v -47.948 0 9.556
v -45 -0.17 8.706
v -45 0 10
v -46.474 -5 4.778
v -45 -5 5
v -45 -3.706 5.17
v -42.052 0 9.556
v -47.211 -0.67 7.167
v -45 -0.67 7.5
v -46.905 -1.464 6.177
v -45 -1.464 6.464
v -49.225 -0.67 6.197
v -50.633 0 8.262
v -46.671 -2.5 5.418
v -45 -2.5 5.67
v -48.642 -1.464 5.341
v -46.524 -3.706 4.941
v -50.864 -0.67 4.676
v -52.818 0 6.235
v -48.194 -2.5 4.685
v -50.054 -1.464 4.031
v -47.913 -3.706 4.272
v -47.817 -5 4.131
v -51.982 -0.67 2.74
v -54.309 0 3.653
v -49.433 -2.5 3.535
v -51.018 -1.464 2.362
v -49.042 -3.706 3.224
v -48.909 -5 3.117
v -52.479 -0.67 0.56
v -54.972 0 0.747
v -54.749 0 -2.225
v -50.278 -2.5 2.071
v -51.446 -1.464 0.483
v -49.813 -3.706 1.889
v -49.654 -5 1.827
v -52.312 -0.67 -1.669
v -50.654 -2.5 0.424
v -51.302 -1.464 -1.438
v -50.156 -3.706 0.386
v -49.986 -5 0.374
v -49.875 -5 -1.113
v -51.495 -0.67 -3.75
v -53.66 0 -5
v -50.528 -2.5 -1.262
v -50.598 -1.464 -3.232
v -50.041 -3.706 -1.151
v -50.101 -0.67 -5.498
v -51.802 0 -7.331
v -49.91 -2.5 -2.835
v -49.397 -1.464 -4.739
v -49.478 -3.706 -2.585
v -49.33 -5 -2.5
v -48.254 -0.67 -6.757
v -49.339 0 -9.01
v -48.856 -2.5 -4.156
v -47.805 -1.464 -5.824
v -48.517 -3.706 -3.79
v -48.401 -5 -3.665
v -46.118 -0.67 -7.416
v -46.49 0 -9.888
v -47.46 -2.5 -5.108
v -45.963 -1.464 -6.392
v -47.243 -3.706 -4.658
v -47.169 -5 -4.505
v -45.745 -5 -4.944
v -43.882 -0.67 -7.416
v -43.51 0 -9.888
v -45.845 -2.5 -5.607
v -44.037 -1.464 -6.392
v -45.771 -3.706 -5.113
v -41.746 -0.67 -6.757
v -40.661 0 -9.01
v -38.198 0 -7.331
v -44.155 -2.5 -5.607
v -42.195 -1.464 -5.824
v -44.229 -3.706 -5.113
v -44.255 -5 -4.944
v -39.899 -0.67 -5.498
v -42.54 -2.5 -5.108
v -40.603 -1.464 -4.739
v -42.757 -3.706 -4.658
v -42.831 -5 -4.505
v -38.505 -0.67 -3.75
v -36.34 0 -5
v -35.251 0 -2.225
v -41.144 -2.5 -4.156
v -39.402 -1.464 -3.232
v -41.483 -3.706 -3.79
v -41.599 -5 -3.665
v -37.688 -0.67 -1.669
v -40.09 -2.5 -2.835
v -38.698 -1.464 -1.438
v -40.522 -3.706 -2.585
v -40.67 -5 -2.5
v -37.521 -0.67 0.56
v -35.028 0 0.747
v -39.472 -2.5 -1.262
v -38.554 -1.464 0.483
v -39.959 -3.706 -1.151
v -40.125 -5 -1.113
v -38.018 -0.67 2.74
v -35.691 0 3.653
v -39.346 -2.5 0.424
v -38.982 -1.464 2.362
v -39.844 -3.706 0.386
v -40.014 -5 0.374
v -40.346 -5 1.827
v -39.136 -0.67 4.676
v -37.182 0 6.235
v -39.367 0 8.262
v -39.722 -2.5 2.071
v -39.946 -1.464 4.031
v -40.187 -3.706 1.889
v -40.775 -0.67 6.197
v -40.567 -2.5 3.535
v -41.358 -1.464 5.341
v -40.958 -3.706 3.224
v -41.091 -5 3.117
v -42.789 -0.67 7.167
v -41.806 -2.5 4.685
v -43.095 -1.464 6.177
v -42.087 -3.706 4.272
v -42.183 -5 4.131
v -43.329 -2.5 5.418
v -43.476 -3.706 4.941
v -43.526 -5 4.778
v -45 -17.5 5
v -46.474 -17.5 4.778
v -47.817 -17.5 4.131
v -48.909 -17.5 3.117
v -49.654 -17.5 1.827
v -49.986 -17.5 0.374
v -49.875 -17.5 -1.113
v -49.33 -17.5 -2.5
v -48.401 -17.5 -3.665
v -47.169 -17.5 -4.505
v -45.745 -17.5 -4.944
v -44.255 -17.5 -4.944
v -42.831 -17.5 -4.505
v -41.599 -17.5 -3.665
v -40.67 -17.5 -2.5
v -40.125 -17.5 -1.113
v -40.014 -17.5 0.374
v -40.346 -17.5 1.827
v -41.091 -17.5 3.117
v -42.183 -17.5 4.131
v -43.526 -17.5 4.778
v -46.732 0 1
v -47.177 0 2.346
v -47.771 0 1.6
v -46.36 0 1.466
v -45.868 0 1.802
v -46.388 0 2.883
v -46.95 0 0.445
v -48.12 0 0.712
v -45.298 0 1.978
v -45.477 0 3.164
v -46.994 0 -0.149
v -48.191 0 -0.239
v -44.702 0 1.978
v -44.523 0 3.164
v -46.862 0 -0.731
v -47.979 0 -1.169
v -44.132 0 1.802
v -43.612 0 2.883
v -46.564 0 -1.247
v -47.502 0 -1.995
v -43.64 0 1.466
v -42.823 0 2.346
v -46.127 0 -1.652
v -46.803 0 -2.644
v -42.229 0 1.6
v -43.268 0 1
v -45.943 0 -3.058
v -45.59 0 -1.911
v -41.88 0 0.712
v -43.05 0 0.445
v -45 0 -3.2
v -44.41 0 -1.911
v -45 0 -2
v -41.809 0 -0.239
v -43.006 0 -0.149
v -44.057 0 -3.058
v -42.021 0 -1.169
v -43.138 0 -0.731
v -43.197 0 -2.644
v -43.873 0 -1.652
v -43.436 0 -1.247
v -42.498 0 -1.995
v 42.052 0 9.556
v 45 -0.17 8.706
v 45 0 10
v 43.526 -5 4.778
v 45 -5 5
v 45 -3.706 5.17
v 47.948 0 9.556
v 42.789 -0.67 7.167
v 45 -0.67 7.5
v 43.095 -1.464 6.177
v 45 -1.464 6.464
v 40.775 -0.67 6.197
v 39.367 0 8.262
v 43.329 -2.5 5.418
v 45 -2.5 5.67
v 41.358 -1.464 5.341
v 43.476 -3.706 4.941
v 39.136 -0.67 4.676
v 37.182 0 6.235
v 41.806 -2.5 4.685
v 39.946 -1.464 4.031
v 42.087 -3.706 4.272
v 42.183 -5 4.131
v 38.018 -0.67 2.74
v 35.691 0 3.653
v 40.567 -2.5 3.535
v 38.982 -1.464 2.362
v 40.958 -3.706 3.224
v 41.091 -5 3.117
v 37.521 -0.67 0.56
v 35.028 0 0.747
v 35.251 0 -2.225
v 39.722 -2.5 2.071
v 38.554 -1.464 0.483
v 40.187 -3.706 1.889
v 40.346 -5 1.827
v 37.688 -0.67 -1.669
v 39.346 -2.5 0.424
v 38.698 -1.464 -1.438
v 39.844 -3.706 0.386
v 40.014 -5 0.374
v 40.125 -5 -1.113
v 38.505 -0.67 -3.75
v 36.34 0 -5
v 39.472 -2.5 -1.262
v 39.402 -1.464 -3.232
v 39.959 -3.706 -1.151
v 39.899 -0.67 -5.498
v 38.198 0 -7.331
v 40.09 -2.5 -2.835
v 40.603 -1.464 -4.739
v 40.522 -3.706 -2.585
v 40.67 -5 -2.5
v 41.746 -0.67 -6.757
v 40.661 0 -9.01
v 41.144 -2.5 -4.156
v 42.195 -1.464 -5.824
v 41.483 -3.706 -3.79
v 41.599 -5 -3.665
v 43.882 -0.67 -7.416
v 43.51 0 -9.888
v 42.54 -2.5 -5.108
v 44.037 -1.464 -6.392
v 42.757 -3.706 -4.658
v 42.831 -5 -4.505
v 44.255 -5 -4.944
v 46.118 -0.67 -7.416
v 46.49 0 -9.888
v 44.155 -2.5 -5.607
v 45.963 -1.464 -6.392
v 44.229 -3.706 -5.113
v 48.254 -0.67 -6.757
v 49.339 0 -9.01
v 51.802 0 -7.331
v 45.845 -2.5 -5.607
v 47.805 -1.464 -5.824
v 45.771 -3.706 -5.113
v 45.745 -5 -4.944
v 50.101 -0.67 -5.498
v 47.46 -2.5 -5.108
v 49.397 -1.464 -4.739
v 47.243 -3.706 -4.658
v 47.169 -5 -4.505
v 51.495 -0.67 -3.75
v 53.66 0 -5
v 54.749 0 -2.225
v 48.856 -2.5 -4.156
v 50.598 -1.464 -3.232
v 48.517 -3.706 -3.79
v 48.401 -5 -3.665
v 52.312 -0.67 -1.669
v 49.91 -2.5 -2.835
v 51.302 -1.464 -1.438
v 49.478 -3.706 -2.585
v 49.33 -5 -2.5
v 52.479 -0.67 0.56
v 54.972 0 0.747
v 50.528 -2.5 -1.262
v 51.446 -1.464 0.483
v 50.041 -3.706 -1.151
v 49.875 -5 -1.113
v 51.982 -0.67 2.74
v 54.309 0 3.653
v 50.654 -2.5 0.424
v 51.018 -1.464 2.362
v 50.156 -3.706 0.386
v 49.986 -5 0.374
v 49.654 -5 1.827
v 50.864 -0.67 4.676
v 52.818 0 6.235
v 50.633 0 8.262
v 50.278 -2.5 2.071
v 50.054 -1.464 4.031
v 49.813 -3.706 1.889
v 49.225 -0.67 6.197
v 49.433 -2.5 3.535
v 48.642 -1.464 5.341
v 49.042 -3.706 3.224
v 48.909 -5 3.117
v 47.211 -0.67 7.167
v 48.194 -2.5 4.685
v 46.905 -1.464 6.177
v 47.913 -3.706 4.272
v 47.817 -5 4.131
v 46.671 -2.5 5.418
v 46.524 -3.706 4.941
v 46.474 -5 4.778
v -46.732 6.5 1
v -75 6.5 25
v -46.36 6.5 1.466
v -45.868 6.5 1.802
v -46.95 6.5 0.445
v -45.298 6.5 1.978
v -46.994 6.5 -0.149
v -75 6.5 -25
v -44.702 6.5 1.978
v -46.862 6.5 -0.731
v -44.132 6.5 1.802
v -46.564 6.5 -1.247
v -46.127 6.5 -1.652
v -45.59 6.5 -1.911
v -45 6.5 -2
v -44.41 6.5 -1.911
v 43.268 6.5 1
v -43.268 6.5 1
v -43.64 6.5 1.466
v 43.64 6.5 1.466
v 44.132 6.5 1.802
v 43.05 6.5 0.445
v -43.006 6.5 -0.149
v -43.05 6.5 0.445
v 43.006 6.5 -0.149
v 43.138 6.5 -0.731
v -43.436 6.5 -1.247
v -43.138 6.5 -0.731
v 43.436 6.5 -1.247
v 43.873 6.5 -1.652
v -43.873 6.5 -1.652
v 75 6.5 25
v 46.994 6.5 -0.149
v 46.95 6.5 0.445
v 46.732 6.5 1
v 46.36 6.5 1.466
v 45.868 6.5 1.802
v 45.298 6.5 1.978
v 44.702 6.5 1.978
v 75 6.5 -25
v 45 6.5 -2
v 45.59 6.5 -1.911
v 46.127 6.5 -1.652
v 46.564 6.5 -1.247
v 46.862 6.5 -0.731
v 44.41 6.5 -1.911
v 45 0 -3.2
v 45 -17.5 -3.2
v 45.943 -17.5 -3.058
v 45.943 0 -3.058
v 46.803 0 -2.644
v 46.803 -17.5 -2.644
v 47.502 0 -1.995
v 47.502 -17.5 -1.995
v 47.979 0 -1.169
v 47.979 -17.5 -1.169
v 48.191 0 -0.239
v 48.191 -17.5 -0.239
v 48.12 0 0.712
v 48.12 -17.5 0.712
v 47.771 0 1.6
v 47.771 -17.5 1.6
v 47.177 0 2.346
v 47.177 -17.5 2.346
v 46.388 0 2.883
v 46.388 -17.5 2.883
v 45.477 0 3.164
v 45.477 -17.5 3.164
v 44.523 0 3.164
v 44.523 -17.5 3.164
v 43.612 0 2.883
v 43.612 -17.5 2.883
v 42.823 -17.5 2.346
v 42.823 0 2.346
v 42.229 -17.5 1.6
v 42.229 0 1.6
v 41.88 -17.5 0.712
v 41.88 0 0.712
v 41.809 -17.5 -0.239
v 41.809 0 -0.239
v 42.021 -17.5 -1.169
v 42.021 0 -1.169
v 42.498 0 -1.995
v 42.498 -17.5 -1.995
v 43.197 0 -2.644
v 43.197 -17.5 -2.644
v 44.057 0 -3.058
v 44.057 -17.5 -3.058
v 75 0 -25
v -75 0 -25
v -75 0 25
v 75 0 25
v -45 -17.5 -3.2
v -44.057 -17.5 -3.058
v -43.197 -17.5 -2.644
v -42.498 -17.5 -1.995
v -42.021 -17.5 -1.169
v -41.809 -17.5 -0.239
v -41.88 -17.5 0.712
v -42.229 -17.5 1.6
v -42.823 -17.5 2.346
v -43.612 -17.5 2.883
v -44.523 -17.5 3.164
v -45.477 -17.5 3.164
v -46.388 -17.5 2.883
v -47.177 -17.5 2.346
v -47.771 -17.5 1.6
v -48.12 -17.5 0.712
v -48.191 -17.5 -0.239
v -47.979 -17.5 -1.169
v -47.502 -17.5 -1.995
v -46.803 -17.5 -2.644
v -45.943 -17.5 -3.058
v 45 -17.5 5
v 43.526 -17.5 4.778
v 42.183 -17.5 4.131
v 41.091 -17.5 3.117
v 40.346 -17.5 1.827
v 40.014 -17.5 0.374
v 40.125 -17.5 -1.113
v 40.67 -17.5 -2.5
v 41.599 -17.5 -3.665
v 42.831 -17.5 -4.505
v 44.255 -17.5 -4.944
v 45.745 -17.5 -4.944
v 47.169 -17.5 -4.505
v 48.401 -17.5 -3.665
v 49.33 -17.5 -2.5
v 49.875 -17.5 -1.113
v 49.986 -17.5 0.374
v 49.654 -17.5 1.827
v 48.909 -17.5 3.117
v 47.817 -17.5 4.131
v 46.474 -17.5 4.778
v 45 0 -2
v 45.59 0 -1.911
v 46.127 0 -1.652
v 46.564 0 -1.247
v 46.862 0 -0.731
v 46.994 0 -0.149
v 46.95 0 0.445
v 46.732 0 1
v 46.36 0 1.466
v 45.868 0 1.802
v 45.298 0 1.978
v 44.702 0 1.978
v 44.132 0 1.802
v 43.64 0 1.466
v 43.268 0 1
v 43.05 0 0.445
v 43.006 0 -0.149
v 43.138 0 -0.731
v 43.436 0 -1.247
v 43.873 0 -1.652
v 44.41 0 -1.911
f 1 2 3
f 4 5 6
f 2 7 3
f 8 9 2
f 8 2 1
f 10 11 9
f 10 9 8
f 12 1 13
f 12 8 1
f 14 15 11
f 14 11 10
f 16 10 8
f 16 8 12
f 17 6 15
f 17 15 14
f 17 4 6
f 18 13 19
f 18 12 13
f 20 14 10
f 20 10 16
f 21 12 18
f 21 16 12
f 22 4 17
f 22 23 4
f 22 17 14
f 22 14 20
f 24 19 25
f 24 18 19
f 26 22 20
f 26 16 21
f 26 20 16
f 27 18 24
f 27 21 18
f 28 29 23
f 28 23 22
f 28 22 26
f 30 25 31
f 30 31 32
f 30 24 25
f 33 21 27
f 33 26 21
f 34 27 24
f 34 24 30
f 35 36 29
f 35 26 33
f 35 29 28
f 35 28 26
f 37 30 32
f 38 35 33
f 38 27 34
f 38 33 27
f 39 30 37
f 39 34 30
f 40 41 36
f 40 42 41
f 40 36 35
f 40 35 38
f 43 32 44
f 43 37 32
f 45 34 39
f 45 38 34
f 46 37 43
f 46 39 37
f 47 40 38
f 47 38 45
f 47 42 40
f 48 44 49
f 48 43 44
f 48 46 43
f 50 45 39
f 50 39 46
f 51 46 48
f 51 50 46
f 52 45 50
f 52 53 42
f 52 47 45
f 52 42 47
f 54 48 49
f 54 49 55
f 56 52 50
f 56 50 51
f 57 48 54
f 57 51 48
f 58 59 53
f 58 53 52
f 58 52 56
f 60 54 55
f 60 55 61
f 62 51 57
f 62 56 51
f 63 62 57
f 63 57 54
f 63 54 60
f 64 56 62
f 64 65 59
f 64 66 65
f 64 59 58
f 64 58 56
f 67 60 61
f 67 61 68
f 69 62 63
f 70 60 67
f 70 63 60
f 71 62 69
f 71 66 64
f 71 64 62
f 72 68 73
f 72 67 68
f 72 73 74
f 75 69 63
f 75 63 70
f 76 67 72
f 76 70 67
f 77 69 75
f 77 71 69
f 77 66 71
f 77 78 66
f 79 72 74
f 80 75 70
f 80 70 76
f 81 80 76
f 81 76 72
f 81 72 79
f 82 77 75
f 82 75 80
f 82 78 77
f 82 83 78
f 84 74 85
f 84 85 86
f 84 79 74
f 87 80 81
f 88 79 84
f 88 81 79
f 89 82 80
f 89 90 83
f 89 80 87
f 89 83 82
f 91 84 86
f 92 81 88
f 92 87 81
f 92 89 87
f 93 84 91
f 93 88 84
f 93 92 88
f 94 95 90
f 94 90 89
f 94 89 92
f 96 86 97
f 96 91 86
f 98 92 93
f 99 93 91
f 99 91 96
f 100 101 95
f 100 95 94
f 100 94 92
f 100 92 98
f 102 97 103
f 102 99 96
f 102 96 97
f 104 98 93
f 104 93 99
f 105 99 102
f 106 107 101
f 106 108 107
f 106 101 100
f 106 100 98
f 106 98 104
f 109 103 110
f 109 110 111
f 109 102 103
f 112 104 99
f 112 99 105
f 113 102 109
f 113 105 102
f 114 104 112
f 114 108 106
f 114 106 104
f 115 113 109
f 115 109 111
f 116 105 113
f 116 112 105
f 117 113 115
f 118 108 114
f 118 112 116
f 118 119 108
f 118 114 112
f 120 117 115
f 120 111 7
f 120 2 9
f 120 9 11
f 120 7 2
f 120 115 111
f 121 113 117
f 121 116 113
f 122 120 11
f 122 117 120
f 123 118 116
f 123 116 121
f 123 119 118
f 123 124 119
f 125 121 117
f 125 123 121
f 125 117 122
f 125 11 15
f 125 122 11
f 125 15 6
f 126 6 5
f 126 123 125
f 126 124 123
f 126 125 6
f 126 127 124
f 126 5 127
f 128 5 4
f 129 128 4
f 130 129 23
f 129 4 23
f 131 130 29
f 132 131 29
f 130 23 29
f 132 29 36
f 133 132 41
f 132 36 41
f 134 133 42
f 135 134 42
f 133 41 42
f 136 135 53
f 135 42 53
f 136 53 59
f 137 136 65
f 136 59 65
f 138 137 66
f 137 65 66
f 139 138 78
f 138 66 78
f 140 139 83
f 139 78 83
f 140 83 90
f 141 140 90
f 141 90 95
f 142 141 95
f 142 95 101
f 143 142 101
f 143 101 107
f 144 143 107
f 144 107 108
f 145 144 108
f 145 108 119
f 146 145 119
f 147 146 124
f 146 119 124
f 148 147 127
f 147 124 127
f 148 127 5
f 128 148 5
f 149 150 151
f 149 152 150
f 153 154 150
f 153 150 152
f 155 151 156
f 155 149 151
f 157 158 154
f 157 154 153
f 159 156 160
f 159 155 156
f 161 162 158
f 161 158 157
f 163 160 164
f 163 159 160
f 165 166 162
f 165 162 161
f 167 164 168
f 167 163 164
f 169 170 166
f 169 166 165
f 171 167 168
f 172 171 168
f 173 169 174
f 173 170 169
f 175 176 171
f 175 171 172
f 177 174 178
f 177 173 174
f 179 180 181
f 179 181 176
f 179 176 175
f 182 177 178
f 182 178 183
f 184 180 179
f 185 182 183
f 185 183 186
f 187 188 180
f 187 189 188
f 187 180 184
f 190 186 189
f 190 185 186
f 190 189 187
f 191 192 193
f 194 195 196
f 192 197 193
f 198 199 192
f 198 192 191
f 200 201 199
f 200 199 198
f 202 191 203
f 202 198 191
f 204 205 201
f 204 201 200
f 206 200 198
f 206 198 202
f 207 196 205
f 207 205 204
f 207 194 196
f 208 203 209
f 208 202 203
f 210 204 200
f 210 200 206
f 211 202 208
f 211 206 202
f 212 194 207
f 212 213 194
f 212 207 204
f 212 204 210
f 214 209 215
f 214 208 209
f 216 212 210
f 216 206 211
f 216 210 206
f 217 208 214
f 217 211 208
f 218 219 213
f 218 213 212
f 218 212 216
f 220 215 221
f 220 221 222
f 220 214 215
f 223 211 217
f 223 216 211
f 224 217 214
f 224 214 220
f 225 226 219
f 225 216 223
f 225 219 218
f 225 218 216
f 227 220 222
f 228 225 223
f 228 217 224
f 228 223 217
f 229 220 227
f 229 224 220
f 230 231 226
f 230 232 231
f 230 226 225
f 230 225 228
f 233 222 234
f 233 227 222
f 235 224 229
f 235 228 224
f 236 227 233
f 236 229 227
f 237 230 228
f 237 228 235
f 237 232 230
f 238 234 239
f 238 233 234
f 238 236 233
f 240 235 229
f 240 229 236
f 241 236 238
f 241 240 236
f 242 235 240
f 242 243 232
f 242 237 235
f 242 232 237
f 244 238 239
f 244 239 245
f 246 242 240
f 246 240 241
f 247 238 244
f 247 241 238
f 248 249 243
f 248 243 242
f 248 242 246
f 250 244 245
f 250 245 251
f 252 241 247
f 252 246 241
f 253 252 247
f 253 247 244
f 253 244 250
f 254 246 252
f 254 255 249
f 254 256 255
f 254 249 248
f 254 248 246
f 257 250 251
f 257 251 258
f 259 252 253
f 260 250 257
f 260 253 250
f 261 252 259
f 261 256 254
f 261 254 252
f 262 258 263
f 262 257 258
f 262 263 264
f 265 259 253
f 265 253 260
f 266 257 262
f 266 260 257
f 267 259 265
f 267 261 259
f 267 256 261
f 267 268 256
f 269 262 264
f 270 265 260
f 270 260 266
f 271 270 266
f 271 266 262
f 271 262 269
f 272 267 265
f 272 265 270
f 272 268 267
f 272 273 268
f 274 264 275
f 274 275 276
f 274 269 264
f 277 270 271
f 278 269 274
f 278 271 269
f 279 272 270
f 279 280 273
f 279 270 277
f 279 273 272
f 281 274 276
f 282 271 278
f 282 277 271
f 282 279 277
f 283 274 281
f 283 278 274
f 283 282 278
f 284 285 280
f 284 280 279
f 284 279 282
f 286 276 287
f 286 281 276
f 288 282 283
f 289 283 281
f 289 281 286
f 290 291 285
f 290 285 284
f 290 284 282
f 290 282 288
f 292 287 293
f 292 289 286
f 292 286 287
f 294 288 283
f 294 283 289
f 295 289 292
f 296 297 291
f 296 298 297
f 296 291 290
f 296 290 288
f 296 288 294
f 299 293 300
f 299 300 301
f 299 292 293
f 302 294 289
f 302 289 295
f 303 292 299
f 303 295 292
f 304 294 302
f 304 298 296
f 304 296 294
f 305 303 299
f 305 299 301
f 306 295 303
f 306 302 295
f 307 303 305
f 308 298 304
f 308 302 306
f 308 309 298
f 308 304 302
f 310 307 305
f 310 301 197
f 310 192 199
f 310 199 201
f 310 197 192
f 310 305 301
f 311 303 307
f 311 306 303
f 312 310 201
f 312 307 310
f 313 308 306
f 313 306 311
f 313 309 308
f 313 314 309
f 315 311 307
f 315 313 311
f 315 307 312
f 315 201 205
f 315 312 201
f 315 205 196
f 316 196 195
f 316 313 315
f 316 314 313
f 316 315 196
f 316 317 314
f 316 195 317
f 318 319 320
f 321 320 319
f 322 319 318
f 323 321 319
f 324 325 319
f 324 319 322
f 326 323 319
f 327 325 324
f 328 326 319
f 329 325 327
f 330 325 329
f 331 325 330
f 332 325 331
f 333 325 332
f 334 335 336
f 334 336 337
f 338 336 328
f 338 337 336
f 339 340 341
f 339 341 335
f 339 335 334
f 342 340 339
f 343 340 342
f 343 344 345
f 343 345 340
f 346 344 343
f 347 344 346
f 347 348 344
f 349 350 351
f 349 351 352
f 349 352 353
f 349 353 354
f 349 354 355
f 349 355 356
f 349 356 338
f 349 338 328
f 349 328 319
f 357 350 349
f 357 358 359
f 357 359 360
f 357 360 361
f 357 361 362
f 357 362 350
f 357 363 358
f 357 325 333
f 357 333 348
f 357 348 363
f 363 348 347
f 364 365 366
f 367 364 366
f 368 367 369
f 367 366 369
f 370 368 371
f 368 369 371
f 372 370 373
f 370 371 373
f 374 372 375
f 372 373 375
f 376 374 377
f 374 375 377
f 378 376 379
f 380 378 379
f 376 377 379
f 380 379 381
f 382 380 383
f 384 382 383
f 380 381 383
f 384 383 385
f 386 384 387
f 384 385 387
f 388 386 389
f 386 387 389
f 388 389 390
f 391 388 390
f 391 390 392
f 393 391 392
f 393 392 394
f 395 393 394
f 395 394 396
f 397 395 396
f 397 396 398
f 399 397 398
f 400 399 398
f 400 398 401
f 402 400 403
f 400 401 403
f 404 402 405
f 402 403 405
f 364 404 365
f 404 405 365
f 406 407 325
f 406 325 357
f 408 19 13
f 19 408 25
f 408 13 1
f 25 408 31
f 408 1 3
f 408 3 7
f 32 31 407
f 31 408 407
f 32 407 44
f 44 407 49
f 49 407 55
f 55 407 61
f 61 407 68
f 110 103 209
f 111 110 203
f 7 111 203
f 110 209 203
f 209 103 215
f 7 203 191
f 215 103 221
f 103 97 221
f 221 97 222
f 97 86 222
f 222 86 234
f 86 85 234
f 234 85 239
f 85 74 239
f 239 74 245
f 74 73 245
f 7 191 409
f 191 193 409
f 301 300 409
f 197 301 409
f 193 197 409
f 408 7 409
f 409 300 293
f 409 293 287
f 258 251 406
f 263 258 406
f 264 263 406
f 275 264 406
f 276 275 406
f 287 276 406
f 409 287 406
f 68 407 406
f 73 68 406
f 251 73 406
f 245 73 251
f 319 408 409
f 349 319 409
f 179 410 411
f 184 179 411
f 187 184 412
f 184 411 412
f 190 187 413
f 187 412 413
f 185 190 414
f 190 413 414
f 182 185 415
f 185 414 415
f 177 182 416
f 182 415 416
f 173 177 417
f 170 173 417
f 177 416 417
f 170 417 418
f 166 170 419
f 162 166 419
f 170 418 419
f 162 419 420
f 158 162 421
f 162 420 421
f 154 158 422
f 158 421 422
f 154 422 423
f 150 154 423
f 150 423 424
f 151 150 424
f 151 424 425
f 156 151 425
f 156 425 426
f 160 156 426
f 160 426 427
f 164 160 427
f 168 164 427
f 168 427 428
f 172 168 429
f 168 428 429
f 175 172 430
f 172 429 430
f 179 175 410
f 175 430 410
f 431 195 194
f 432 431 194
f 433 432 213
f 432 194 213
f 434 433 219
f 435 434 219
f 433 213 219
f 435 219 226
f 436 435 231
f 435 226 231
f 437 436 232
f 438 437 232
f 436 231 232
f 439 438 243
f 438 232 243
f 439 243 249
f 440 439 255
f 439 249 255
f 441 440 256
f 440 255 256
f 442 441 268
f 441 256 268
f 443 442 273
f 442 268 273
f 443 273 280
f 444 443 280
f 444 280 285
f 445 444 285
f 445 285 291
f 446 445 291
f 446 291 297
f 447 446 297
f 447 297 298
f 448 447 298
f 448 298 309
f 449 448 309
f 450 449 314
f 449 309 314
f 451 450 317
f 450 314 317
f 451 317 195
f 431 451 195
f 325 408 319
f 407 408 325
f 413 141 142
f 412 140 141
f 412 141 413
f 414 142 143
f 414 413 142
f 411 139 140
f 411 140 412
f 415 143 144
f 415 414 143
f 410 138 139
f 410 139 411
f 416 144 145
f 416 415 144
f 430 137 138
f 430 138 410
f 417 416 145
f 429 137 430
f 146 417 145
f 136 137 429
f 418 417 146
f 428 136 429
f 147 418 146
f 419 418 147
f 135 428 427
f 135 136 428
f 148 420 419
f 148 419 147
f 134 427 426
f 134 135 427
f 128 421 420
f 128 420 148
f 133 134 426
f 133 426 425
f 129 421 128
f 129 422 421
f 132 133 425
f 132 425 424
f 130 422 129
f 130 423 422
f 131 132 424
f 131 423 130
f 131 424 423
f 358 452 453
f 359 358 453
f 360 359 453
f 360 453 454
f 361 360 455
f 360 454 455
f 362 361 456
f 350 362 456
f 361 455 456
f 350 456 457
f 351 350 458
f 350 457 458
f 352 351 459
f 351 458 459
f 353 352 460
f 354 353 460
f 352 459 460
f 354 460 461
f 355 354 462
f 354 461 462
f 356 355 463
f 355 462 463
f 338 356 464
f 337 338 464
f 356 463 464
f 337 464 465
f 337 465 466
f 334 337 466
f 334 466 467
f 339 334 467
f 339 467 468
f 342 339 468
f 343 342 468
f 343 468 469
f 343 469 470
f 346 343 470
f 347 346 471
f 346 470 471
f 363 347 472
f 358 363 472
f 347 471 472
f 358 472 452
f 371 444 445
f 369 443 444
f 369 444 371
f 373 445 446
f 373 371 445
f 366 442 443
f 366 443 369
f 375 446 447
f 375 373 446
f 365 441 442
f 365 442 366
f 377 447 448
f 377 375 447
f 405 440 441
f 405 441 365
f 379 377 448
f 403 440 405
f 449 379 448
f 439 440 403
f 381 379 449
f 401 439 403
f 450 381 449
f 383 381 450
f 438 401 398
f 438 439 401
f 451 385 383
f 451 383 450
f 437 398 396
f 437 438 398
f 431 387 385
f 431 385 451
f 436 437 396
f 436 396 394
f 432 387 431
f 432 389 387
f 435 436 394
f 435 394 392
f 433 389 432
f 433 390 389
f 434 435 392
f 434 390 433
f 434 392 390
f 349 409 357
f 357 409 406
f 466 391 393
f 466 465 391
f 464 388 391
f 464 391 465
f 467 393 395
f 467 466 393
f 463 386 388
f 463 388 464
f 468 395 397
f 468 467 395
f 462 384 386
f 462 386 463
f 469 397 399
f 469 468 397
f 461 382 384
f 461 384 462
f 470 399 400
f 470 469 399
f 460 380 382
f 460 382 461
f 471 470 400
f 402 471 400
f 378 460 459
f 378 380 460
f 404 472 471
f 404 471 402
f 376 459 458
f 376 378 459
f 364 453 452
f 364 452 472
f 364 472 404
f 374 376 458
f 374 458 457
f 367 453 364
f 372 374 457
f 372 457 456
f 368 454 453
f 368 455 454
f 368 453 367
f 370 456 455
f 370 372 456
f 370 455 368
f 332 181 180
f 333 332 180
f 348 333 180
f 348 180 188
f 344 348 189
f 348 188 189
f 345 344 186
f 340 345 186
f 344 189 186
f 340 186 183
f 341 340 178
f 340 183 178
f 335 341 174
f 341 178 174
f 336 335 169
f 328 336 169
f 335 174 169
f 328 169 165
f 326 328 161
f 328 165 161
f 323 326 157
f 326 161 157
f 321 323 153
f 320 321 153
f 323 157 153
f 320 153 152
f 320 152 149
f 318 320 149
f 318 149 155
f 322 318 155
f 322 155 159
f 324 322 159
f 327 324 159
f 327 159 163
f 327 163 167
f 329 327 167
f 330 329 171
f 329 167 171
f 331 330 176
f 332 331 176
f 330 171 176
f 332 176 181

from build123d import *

# Parameters (mm, degrees)
SKETCH1_W           = 150
SKETCH1_H           = 50
BOSS_EXTRUDE1_DEPTH = 6.5
SKETCH3_R           = 5
BOSS_EXTRUDE2_DEPTH = 17.5
FILLET1_R           = 5
SKETCH4_R           = 3.2
CUT_EXTRUDE1_DEPTH  = 17.5
SKETCH5_R           = 2
CUT_EXTRUDE2_DEPTH  = 6.5


with BuildPart() as part:
    # Sketch1 → Boss-Extrude1 (new body)
    with BuildSketch(Plane(origin=(0, 0, 0), x_dir=(1, 0, 0), z_dir=(0, 1, 0))):
        Rectangle(SKETCH1_W, SKETCH1_H)
    extrude(amount=BOSS_EXTRUDE1_DEPTH)

    # Sketch3 → Boss-Extrude2 (add)
    with BuildSketch(Plane.XZ):
        with Locations(Location((45, 0, 0), (0, 0, 90))):
            Circle(SKETCH3_R)
        with Locations(Location((-45, 0, 0), (0, 0, 90))):
            Circle(SKETCH3_R)
    extrude(amount=BOSS_EXTRUDE2_DEPTH)

    # Fillet1
    fillet1_edges = [part.edges().sort_by_distance(p)[0] for p in [
        (45, 0, -5),
        (-45, 0, -5),
    ]]
    fillet(fillet1_edges, radius=FILLET1_R)

    # Sketch4 → Cut-Extrude1 (cut)
    with BuildSketch(Plane.XZ.offset(17.5)):
        with Locations(Location((45, 0, 0), (0, 0, 270))):
            Circle(SKETCH4_R)
        with Locations(Location((-45, 0, 0), (0, 0, 270))):
            Circle(SKETCH4_R)
    extrude(amount=-CUT_EXTRUDE1_DEPTH, mode=Mode.SUBTRACT)

    # Sketch5 → Cut-Extrude2 (cut)
    with BuildSketch(Plane.XZ):
        with Locations(Location((45, 0, 0), (0, 0, 270))):
            Circle(SKETCH5_R)
        with Locations(Location((-45, 0, 0), (0, 0, 270))):
            Circle(SKETCH5_R)
    extrude(amount=-CUT_EXTRUDE2_DEPTH, mode=Mode.SUBTRACT)


solid = part.part
